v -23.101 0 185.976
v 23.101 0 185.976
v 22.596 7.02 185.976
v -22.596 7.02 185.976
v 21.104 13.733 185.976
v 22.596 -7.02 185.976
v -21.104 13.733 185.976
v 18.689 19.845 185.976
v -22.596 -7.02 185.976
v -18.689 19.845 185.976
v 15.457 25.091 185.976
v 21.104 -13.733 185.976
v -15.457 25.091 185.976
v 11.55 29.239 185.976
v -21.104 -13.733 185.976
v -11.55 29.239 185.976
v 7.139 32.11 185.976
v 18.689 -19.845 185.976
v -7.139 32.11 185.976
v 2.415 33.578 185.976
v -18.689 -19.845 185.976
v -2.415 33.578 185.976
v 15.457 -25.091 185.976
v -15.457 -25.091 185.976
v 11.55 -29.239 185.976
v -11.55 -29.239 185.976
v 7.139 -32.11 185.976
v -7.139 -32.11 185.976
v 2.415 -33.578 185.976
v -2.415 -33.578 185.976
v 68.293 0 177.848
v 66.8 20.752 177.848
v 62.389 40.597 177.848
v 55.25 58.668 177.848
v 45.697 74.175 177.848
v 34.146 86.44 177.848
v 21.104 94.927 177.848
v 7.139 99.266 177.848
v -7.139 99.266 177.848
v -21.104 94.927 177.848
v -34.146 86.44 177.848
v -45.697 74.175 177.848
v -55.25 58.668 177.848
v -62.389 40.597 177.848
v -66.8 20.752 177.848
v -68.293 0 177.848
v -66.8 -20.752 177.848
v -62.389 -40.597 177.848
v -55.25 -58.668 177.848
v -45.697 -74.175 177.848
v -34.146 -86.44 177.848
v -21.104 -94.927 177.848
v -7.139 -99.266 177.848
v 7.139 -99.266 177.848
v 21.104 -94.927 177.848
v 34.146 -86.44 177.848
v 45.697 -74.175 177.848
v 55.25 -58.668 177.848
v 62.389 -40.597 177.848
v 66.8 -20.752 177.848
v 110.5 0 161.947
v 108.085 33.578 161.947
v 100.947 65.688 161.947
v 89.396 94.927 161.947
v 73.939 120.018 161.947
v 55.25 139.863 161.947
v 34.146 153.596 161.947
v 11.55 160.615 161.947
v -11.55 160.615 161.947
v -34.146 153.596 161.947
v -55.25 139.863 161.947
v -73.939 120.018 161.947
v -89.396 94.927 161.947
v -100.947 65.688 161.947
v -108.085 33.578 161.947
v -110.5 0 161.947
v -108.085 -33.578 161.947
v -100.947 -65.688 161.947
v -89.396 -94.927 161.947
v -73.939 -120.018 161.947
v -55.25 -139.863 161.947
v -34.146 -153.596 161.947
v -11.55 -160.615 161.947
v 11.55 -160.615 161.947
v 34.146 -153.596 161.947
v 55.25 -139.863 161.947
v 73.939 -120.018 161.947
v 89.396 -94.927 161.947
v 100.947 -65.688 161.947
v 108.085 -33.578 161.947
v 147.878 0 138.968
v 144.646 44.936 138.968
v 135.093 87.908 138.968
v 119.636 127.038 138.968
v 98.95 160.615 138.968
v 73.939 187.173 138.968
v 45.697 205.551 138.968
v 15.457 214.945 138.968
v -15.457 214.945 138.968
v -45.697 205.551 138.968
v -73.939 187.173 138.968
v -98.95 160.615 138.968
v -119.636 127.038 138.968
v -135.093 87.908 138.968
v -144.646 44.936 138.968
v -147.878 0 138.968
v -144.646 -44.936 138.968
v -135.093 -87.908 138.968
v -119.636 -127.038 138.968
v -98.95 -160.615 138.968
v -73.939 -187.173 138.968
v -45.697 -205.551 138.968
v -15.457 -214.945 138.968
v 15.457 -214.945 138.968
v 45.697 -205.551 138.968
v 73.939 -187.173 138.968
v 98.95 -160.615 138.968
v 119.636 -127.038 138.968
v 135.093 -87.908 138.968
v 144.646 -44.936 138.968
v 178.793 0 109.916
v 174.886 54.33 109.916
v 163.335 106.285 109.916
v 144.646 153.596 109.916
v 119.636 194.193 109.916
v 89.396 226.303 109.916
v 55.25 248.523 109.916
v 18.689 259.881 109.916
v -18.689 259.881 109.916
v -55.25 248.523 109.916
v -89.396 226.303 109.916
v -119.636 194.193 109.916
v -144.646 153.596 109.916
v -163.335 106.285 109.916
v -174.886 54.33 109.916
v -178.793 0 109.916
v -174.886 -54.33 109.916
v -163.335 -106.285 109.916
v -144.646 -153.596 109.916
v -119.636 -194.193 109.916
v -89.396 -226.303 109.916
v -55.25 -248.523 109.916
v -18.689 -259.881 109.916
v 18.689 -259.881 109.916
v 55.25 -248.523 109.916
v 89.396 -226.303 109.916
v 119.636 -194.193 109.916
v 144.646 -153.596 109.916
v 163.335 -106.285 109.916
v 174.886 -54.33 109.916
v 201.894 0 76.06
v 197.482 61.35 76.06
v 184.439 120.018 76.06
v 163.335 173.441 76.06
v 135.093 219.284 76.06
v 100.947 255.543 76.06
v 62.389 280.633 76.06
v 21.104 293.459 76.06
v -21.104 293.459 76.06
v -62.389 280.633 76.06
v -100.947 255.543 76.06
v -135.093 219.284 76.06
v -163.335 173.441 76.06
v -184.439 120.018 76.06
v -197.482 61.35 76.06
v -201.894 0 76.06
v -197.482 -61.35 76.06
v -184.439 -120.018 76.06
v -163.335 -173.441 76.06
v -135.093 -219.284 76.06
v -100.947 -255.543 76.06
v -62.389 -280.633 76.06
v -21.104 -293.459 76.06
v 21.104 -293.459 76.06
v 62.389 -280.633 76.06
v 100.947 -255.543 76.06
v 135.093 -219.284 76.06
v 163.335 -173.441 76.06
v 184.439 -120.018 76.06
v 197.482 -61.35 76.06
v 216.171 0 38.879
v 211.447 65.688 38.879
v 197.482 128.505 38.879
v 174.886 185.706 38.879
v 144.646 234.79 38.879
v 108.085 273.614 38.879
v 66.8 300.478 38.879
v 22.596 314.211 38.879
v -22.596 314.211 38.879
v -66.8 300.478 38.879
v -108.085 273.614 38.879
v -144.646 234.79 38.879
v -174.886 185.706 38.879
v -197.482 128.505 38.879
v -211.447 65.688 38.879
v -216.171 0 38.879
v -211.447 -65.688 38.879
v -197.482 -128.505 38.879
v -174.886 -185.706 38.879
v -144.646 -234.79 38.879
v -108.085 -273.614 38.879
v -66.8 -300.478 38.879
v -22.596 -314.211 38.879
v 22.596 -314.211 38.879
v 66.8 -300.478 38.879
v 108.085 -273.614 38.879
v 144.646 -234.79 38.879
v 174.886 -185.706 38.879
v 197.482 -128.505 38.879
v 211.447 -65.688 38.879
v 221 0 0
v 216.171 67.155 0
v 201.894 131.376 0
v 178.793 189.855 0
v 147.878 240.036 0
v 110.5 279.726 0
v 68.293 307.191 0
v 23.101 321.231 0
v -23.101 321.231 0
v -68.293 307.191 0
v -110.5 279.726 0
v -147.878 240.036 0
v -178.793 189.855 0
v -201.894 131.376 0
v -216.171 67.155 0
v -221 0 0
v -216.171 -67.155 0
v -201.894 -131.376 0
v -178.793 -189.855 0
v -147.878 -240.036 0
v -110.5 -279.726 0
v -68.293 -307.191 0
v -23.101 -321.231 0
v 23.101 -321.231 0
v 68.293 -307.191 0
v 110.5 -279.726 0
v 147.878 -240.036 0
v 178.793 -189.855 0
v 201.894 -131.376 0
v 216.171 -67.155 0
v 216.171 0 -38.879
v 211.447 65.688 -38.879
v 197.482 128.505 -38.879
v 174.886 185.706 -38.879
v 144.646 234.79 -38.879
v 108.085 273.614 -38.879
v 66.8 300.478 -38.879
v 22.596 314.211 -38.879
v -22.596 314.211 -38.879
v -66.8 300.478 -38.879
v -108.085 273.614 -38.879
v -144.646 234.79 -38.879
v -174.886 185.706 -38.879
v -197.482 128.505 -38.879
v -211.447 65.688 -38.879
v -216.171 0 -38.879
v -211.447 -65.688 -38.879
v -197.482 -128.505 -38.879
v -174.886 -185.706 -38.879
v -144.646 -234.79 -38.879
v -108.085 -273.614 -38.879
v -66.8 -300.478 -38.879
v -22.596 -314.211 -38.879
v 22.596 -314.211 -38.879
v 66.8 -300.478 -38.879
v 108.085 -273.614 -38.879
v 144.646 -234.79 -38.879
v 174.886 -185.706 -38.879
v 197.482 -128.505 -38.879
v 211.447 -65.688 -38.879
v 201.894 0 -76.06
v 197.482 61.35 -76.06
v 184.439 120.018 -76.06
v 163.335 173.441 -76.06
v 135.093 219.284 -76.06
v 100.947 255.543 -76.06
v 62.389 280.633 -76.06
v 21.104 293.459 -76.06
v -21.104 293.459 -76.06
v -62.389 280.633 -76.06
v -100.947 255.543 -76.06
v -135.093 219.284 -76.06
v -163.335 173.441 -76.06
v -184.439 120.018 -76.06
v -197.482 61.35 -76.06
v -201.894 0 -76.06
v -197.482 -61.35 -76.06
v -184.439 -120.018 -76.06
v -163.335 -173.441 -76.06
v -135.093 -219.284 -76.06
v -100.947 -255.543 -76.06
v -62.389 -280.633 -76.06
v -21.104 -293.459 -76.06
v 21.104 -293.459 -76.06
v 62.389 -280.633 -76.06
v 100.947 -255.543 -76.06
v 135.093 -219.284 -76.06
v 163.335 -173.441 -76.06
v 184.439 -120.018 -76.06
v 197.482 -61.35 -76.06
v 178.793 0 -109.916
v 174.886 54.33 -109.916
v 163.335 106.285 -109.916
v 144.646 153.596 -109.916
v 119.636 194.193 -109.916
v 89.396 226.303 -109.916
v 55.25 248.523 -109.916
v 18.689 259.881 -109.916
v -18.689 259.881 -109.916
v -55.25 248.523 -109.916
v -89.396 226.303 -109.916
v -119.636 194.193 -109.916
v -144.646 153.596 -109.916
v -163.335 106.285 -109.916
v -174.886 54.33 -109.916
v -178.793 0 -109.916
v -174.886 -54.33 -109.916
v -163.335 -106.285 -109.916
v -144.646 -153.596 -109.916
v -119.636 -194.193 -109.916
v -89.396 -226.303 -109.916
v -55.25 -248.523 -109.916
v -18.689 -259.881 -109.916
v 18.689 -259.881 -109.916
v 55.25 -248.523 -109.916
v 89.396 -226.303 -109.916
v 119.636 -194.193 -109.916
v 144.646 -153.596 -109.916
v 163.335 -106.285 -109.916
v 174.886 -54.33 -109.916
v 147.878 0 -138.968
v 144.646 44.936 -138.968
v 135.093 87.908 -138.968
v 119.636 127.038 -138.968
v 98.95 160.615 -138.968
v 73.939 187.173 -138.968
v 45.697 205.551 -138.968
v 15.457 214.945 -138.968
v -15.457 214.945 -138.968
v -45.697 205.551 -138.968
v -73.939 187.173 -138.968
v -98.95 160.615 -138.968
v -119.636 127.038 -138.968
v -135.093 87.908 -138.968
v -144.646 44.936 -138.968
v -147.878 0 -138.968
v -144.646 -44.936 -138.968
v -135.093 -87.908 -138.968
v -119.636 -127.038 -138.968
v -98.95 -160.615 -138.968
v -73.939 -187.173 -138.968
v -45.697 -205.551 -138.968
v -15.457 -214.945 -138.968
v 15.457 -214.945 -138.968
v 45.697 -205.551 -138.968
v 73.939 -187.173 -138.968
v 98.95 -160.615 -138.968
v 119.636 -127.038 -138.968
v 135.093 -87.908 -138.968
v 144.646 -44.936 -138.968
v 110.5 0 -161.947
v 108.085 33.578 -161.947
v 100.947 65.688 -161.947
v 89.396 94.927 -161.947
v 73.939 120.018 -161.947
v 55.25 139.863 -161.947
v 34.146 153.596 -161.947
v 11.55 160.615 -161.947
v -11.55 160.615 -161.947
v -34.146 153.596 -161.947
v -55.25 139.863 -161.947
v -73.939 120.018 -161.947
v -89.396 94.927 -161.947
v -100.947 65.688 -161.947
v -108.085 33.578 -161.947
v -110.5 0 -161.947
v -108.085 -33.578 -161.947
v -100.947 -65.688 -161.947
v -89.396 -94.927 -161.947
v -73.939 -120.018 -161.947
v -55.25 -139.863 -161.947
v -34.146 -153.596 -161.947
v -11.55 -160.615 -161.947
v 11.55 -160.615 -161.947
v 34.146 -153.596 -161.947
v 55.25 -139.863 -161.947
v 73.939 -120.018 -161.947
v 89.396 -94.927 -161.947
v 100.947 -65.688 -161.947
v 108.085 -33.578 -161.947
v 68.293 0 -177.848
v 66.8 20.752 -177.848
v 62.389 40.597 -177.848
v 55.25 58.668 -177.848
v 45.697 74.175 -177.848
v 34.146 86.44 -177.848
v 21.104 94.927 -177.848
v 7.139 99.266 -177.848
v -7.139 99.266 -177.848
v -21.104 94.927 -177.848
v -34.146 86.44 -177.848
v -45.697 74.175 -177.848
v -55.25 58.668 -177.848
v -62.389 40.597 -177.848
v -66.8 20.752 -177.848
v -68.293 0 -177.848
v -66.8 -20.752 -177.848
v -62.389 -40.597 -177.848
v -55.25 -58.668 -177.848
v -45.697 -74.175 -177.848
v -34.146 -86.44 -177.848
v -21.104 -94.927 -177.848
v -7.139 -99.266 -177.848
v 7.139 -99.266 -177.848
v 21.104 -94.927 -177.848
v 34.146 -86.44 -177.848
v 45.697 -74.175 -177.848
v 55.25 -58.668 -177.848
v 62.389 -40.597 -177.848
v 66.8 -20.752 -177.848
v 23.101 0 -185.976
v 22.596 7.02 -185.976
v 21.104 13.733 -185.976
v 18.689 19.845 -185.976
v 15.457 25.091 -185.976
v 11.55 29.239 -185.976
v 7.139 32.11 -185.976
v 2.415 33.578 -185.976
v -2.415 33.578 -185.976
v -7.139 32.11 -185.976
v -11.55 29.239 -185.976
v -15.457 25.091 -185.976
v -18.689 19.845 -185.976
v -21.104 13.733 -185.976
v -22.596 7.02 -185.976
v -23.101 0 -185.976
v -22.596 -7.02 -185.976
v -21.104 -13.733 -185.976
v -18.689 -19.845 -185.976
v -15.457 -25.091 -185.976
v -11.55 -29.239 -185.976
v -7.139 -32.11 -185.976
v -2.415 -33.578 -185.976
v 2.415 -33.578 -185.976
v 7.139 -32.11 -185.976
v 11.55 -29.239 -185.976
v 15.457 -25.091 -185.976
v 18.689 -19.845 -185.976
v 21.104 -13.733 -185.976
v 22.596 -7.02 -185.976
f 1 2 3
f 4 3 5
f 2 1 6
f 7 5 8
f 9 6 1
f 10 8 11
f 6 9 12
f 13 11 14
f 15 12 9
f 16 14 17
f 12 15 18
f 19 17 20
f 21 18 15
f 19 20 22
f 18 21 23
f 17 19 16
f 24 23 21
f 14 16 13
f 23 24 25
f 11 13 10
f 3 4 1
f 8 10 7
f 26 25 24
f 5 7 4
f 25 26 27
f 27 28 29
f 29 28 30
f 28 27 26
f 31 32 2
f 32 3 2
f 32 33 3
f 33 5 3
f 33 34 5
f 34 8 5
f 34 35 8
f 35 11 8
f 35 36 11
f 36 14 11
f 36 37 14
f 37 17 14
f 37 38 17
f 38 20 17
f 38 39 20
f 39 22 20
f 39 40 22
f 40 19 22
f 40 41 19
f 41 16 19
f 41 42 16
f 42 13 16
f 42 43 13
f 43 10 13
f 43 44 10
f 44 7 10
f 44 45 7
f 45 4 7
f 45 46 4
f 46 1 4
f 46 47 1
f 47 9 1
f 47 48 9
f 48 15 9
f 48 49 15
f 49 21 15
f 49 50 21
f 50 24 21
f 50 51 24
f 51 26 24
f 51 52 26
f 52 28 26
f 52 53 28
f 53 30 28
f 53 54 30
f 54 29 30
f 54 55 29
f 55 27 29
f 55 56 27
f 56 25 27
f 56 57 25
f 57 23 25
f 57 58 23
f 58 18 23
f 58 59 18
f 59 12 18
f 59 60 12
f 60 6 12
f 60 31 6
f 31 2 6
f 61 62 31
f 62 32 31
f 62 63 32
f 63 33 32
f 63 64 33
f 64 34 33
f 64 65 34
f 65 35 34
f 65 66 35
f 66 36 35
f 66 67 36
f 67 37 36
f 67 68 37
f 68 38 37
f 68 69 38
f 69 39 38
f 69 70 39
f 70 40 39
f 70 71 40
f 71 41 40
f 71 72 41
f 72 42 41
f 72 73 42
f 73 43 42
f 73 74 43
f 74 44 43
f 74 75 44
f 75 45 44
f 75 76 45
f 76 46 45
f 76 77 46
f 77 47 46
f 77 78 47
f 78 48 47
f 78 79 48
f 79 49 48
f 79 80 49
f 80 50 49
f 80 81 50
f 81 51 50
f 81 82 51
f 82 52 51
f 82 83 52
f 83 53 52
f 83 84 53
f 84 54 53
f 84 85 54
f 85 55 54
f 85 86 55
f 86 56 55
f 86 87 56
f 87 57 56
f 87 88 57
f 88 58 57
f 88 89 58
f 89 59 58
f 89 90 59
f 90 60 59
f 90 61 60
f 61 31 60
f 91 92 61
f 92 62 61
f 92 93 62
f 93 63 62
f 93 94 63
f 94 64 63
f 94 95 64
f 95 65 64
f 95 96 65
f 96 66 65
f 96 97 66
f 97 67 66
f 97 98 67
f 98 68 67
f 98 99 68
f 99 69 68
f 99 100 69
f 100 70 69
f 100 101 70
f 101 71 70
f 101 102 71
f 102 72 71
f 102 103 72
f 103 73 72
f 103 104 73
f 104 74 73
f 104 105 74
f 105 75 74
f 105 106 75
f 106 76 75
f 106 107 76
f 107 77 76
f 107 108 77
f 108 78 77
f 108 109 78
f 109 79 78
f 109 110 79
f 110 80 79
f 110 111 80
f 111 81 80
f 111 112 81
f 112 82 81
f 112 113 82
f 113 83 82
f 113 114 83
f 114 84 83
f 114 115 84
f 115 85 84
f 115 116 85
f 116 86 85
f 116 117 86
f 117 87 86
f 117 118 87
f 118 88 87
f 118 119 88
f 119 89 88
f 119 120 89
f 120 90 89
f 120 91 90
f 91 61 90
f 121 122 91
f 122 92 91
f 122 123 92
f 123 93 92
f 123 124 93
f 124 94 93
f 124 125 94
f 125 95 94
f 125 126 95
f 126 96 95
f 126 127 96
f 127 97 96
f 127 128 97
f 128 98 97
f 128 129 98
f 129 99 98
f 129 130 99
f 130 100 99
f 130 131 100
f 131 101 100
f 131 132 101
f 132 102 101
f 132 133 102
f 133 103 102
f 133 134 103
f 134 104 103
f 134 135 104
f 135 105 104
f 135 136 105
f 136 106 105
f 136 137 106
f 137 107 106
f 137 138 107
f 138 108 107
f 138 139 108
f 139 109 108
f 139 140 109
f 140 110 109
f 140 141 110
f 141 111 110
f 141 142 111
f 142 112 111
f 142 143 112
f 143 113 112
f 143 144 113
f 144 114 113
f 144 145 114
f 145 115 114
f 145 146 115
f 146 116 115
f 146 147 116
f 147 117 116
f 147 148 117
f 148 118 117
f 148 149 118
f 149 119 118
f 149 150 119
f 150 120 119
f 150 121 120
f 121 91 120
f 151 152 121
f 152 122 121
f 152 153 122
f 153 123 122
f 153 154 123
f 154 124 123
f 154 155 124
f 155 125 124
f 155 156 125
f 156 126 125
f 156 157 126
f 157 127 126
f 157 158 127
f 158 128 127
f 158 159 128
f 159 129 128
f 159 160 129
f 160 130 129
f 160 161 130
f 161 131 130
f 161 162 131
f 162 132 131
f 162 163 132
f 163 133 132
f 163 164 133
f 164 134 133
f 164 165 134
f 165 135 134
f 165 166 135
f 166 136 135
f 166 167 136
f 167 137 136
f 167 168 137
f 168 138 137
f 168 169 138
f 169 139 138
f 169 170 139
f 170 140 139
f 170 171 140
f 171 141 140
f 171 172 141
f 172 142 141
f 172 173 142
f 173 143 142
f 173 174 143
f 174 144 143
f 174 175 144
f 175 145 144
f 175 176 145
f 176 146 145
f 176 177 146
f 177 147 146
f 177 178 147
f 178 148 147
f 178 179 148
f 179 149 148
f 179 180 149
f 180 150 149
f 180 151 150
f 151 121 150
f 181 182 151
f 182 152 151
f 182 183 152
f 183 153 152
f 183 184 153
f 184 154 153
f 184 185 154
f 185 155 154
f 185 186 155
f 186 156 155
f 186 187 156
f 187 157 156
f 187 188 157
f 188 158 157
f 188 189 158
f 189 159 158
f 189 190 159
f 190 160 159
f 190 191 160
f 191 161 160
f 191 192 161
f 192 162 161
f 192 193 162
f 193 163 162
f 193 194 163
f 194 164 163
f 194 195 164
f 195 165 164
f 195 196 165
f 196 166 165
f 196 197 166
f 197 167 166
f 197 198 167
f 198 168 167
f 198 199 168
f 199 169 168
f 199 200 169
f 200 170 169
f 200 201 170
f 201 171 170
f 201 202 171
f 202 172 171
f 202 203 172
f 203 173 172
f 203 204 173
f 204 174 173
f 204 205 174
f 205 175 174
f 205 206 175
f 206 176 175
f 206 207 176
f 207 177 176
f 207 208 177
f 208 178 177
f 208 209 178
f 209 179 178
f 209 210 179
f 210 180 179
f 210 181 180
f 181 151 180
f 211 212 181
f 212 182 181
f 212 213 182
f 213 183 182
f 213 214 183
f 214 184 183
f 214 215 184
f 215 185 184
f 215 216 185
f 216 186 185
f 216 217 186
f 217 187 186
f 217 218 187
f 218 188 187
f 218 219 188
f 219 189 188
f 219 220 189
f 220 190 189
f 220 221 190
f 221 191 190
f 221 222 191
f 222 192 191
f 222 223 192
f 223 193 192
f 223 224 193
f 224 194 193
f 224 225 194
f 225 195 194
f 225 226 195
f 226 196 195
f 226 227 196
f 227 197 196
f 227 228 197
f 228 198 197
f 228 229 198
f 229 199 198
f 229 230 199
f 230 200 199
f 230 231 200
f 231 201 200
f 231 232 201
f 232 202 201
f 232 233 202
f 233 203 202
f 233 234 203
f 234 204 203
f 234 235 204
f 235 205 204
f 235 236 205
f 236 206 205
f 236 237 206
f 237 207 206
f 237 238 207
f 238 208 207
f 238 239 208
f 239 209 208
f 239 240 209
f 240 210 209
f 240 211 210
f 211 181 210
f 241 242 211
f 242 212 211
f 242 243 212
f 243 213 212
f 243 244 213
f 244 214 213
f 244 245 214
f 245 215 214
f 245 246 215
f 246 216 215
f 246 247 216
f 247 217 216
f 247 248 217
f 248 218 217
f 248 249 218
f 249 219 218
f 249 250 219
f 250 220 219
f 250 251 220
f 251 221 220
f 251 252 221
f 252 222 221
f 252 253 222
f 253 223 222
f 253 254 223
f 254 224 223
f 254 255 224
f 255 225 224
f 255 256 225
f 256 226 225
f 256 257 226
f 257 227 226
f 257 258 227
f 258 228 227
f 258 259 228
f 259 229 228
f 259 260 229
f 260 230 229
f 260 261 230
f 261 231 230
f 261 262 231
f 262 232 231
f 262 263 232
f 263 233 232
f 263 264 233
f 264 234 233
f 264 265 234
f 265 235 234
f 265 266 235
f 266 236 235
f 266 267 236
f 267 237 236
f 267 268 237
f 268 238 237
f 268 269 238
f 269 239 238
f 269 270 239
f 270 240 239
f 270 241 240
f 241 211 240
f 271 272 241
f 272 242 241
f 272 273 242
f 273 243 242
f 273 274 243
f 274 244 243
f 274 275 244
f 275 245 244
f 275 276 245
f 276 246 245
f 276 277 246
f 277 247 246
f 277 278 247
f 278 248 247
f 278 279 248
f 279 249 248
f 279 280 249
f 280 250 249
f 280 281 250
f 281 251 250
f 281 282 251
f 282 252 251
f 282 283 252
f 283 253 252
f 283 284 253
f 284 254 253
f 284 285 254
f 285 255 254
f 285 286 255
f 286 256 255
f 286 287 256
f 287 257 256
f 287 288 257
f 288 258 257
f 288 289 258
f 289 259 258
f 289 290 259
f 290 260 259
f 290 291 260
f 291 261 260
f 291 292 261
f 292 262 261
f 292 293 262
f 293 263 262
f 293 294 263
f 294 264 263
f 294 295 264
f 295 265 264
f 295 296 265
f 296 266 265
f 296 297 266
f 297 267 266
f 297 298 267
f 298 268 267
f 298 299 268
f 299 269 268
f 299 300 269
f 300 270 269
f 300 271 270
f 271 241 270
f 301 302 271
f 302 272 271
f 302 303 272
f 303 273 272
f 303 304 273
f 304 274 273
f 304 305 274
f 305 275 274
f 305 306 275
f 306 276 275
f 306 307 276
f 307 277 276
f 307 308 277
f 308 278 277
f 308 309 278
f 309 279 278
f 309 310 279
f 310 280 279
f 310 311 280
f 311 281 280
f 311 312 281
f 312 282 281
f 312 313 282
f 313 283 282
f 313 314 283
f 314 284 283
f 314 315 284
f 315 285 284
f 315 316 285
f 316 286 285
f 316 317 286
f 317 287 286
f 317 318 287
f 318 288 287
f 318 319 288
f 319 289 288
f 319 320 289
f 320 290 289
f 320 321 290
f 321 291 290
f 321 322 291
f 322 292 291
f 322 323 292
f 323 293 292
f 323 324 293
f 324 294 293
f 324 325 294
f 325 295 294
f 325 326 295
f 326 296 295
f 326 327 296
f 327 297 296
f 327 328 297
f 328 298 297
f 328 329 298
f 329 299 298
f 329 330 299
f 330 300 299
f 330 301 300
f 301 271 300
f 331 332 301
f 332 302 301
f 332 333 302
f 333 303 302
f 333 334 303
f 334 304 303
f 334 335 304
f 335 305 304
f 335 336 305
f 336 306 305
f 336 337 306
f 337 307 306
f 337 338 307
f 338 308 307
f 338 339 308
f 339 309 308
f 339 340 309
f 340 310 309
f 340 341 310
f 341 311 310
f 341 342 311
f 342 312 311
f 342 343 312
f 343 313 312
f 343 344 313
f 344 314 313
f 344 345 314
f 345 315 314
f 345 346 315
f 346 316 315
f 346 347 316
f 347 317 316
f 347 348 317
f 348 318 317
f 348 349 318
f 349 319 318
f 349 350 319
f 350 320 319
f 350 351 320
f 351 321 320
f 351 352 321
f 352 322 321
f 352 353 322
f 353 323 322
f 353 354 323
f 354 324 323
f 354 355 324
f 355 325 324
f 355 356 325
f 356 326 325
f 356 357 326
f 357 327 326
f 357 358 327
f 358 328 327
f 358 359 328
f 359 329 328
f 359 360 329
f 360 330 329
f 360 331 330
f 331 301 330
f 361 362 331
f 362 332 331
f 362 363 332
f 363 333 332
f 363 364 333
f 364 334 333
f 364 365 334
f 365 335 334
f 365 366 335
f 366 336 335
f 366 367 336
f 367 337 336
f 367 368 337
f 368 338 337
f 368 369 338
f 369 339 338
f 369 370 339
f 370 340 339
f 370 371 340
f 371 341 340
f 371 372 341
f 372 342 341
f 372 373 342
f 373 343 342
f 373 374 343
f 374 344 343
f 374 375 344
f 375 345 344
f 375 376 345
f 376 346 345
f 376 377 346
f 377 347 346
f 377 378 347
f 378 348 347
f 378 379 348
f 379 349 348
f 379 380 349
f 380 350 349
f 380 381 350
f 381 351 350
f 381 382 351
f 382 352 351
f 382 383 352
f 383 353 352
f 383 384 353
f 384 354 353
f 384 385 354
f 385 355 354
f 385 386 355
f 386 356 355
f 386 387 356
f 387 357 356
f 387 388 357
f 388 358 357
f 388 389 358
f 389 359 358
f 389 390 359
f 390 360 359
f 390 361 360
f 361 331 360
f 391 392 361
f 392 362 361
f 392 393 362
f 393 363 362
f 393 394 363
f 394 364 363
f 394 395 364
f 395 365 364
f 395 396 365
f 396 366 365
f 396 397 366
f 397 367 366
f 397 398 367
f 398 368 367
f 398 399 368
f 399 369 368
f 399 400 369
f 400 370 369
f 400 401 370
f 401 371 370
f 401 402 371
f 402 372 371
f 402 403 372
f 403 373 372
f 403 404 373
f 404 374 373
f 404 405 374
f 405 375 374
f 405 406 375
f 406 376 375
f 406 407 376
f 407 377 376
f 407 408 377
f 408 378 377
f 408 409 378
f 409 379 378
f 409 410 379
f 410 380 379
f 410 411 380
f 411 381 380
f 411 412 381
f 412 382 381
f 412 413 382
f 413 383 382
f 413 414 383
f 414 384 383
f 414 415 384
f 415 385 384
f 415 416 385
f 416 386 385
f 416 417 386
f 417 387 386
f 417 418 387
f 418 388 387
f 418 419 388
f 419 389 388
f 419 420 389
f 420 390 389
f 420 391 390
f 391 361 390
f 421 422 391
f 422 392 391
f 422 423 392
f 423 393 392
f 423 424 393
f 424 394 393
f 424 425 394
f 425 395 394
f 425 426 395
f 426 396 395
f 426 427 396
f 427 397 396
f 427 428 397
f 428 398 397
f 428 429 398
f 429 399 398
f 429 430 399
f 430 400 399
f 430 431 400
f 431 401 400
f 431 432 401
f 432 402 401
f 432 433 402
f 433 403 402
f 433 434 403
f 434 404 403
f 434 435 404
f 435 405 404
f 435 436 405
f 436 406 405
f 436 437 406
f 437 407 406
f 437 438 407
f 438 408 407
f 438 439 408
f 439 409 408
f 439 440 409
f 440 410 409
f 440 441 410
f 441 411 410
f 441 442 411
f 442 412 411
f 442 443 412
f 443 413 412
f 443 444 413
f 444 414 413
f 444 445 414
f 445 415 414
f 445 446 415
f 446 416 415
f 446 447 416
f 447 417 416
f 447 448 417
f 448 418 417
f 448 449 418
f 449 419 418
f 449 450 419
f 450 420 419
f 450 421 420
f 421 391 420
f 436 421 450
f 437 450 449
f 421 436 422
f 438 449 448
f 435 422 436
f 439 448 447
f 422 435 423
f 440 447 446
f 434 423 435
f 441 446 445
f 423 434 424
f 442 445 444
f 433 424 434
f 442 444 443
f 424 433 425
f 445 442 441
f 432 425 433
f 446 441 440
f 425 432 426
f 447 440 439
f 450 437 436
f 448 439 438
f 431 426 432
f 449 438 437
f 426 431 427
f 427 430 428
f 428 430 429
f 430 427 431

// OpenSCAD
// Generated by SolidPython 1.0.1 on 2020-07-29 00:46:51


scale(v = [13, 19, 11]) {
	sphere(r = 17);
}
/***********************************************
*********      SolidPython code:      **********
************************************************
 
# import packages: SolidPython
from solid import *
from solid.utils import *
from itertools import chain, combinations, permutations


class Resize:

    def __init__(self, scad_file):
        self.scad_file = scad_file
        #self.scad_file = import_scad(scad_file)
        # cone/cylinder param:
        self.r1 = 0
        self.r2 = 0
        self.h = 0
        # rectangular prism param:
        self.w = 0
        self.l = 0
        # ellipse param:
        self.r = 0

    # import OpenScad code (file name corresponds to shape)


    # classify shape + parameters
    def assign(self, param1, param2, param3):
        if self.scad_file == 'cone.scad':
            self.r1 = param1
            self.r2 = param2
            self.h = param3
        elif self.scad_file == 'cylinder.scad':
            self.r1 = param1
            self.r2 = param2
            self.h = param3
        elif self.scad_file == 'rectangularPrism.scad':
            self.h = param1
            self.l = param2
            self.w = param3
        else:
            self.r = param1
            self.h = param2

    # resize parameters
    def iterate(self):
        x = range(3, 20, 2)
        i = 1
        if self.scad_file == 'cone.scad':
            tempList = list(permutations(x, 2))
            for temp in tempList:
                param1 = temp[0]
                param2 = temp[1]
                filepath = 'produced_scad_files/' + 'cone' + str(param1) + '_' + str(param2) + '_' + '.scad'
                scad_render_to_file(cylinder(h=param1, r1=param2, r2=0), filepath)

        elif self.scad_file == 'cylinder.scad':
            tempList = list(permutations(x, 3))
            for temp in tempList:
                param1 = temp[0]
                param2 = temp[1]
                filepath = 'produced_scad_files/' + 'cylinder' + str(param1) + '_' + str(param2) + '_' + '.scad'
                scad_render_to_file(cylinder(h=param1, r1=param2, r2=param2), filepath)

        elif self.scad_file == 'rectangularPrism.scad':
            tempList = list(permutations(x, 3))
            for temp in tempList:
                param1 = temp[0]
                param2 = temp[1]
                param3 = temp[2]
                filepath = 'produced_scad_files/' + 'rectangularPrism' + str(param1) + '_' + str(param2) + '_' + str(
                    param3) + '.scad'
                scad_render_to_file(cube(size=(param1, param2, param3)), filepath)

        elif self.scad_file == 'ellipse.scad':
            tempList = list(permutations(x, 4))
            for temp in tempList:
                param1 = temp[0]
                param2 = temp[1]
                param3 = temp[2]
                param4 = temp[3]
                filepath = 'produced_scad_files/' + 'ellipse' + str(param1) + '_' + str(param2) + '_' + str(param3) + '_' + str(param4) + '.scad'
                scad_render_to_file(scale([param1, param2, param3])(sphere(r=param4)), filepath)

    def render_to_scadfile(self):
        scad_render_to_file(scad, 'example.scad') 
 
************************************************/
